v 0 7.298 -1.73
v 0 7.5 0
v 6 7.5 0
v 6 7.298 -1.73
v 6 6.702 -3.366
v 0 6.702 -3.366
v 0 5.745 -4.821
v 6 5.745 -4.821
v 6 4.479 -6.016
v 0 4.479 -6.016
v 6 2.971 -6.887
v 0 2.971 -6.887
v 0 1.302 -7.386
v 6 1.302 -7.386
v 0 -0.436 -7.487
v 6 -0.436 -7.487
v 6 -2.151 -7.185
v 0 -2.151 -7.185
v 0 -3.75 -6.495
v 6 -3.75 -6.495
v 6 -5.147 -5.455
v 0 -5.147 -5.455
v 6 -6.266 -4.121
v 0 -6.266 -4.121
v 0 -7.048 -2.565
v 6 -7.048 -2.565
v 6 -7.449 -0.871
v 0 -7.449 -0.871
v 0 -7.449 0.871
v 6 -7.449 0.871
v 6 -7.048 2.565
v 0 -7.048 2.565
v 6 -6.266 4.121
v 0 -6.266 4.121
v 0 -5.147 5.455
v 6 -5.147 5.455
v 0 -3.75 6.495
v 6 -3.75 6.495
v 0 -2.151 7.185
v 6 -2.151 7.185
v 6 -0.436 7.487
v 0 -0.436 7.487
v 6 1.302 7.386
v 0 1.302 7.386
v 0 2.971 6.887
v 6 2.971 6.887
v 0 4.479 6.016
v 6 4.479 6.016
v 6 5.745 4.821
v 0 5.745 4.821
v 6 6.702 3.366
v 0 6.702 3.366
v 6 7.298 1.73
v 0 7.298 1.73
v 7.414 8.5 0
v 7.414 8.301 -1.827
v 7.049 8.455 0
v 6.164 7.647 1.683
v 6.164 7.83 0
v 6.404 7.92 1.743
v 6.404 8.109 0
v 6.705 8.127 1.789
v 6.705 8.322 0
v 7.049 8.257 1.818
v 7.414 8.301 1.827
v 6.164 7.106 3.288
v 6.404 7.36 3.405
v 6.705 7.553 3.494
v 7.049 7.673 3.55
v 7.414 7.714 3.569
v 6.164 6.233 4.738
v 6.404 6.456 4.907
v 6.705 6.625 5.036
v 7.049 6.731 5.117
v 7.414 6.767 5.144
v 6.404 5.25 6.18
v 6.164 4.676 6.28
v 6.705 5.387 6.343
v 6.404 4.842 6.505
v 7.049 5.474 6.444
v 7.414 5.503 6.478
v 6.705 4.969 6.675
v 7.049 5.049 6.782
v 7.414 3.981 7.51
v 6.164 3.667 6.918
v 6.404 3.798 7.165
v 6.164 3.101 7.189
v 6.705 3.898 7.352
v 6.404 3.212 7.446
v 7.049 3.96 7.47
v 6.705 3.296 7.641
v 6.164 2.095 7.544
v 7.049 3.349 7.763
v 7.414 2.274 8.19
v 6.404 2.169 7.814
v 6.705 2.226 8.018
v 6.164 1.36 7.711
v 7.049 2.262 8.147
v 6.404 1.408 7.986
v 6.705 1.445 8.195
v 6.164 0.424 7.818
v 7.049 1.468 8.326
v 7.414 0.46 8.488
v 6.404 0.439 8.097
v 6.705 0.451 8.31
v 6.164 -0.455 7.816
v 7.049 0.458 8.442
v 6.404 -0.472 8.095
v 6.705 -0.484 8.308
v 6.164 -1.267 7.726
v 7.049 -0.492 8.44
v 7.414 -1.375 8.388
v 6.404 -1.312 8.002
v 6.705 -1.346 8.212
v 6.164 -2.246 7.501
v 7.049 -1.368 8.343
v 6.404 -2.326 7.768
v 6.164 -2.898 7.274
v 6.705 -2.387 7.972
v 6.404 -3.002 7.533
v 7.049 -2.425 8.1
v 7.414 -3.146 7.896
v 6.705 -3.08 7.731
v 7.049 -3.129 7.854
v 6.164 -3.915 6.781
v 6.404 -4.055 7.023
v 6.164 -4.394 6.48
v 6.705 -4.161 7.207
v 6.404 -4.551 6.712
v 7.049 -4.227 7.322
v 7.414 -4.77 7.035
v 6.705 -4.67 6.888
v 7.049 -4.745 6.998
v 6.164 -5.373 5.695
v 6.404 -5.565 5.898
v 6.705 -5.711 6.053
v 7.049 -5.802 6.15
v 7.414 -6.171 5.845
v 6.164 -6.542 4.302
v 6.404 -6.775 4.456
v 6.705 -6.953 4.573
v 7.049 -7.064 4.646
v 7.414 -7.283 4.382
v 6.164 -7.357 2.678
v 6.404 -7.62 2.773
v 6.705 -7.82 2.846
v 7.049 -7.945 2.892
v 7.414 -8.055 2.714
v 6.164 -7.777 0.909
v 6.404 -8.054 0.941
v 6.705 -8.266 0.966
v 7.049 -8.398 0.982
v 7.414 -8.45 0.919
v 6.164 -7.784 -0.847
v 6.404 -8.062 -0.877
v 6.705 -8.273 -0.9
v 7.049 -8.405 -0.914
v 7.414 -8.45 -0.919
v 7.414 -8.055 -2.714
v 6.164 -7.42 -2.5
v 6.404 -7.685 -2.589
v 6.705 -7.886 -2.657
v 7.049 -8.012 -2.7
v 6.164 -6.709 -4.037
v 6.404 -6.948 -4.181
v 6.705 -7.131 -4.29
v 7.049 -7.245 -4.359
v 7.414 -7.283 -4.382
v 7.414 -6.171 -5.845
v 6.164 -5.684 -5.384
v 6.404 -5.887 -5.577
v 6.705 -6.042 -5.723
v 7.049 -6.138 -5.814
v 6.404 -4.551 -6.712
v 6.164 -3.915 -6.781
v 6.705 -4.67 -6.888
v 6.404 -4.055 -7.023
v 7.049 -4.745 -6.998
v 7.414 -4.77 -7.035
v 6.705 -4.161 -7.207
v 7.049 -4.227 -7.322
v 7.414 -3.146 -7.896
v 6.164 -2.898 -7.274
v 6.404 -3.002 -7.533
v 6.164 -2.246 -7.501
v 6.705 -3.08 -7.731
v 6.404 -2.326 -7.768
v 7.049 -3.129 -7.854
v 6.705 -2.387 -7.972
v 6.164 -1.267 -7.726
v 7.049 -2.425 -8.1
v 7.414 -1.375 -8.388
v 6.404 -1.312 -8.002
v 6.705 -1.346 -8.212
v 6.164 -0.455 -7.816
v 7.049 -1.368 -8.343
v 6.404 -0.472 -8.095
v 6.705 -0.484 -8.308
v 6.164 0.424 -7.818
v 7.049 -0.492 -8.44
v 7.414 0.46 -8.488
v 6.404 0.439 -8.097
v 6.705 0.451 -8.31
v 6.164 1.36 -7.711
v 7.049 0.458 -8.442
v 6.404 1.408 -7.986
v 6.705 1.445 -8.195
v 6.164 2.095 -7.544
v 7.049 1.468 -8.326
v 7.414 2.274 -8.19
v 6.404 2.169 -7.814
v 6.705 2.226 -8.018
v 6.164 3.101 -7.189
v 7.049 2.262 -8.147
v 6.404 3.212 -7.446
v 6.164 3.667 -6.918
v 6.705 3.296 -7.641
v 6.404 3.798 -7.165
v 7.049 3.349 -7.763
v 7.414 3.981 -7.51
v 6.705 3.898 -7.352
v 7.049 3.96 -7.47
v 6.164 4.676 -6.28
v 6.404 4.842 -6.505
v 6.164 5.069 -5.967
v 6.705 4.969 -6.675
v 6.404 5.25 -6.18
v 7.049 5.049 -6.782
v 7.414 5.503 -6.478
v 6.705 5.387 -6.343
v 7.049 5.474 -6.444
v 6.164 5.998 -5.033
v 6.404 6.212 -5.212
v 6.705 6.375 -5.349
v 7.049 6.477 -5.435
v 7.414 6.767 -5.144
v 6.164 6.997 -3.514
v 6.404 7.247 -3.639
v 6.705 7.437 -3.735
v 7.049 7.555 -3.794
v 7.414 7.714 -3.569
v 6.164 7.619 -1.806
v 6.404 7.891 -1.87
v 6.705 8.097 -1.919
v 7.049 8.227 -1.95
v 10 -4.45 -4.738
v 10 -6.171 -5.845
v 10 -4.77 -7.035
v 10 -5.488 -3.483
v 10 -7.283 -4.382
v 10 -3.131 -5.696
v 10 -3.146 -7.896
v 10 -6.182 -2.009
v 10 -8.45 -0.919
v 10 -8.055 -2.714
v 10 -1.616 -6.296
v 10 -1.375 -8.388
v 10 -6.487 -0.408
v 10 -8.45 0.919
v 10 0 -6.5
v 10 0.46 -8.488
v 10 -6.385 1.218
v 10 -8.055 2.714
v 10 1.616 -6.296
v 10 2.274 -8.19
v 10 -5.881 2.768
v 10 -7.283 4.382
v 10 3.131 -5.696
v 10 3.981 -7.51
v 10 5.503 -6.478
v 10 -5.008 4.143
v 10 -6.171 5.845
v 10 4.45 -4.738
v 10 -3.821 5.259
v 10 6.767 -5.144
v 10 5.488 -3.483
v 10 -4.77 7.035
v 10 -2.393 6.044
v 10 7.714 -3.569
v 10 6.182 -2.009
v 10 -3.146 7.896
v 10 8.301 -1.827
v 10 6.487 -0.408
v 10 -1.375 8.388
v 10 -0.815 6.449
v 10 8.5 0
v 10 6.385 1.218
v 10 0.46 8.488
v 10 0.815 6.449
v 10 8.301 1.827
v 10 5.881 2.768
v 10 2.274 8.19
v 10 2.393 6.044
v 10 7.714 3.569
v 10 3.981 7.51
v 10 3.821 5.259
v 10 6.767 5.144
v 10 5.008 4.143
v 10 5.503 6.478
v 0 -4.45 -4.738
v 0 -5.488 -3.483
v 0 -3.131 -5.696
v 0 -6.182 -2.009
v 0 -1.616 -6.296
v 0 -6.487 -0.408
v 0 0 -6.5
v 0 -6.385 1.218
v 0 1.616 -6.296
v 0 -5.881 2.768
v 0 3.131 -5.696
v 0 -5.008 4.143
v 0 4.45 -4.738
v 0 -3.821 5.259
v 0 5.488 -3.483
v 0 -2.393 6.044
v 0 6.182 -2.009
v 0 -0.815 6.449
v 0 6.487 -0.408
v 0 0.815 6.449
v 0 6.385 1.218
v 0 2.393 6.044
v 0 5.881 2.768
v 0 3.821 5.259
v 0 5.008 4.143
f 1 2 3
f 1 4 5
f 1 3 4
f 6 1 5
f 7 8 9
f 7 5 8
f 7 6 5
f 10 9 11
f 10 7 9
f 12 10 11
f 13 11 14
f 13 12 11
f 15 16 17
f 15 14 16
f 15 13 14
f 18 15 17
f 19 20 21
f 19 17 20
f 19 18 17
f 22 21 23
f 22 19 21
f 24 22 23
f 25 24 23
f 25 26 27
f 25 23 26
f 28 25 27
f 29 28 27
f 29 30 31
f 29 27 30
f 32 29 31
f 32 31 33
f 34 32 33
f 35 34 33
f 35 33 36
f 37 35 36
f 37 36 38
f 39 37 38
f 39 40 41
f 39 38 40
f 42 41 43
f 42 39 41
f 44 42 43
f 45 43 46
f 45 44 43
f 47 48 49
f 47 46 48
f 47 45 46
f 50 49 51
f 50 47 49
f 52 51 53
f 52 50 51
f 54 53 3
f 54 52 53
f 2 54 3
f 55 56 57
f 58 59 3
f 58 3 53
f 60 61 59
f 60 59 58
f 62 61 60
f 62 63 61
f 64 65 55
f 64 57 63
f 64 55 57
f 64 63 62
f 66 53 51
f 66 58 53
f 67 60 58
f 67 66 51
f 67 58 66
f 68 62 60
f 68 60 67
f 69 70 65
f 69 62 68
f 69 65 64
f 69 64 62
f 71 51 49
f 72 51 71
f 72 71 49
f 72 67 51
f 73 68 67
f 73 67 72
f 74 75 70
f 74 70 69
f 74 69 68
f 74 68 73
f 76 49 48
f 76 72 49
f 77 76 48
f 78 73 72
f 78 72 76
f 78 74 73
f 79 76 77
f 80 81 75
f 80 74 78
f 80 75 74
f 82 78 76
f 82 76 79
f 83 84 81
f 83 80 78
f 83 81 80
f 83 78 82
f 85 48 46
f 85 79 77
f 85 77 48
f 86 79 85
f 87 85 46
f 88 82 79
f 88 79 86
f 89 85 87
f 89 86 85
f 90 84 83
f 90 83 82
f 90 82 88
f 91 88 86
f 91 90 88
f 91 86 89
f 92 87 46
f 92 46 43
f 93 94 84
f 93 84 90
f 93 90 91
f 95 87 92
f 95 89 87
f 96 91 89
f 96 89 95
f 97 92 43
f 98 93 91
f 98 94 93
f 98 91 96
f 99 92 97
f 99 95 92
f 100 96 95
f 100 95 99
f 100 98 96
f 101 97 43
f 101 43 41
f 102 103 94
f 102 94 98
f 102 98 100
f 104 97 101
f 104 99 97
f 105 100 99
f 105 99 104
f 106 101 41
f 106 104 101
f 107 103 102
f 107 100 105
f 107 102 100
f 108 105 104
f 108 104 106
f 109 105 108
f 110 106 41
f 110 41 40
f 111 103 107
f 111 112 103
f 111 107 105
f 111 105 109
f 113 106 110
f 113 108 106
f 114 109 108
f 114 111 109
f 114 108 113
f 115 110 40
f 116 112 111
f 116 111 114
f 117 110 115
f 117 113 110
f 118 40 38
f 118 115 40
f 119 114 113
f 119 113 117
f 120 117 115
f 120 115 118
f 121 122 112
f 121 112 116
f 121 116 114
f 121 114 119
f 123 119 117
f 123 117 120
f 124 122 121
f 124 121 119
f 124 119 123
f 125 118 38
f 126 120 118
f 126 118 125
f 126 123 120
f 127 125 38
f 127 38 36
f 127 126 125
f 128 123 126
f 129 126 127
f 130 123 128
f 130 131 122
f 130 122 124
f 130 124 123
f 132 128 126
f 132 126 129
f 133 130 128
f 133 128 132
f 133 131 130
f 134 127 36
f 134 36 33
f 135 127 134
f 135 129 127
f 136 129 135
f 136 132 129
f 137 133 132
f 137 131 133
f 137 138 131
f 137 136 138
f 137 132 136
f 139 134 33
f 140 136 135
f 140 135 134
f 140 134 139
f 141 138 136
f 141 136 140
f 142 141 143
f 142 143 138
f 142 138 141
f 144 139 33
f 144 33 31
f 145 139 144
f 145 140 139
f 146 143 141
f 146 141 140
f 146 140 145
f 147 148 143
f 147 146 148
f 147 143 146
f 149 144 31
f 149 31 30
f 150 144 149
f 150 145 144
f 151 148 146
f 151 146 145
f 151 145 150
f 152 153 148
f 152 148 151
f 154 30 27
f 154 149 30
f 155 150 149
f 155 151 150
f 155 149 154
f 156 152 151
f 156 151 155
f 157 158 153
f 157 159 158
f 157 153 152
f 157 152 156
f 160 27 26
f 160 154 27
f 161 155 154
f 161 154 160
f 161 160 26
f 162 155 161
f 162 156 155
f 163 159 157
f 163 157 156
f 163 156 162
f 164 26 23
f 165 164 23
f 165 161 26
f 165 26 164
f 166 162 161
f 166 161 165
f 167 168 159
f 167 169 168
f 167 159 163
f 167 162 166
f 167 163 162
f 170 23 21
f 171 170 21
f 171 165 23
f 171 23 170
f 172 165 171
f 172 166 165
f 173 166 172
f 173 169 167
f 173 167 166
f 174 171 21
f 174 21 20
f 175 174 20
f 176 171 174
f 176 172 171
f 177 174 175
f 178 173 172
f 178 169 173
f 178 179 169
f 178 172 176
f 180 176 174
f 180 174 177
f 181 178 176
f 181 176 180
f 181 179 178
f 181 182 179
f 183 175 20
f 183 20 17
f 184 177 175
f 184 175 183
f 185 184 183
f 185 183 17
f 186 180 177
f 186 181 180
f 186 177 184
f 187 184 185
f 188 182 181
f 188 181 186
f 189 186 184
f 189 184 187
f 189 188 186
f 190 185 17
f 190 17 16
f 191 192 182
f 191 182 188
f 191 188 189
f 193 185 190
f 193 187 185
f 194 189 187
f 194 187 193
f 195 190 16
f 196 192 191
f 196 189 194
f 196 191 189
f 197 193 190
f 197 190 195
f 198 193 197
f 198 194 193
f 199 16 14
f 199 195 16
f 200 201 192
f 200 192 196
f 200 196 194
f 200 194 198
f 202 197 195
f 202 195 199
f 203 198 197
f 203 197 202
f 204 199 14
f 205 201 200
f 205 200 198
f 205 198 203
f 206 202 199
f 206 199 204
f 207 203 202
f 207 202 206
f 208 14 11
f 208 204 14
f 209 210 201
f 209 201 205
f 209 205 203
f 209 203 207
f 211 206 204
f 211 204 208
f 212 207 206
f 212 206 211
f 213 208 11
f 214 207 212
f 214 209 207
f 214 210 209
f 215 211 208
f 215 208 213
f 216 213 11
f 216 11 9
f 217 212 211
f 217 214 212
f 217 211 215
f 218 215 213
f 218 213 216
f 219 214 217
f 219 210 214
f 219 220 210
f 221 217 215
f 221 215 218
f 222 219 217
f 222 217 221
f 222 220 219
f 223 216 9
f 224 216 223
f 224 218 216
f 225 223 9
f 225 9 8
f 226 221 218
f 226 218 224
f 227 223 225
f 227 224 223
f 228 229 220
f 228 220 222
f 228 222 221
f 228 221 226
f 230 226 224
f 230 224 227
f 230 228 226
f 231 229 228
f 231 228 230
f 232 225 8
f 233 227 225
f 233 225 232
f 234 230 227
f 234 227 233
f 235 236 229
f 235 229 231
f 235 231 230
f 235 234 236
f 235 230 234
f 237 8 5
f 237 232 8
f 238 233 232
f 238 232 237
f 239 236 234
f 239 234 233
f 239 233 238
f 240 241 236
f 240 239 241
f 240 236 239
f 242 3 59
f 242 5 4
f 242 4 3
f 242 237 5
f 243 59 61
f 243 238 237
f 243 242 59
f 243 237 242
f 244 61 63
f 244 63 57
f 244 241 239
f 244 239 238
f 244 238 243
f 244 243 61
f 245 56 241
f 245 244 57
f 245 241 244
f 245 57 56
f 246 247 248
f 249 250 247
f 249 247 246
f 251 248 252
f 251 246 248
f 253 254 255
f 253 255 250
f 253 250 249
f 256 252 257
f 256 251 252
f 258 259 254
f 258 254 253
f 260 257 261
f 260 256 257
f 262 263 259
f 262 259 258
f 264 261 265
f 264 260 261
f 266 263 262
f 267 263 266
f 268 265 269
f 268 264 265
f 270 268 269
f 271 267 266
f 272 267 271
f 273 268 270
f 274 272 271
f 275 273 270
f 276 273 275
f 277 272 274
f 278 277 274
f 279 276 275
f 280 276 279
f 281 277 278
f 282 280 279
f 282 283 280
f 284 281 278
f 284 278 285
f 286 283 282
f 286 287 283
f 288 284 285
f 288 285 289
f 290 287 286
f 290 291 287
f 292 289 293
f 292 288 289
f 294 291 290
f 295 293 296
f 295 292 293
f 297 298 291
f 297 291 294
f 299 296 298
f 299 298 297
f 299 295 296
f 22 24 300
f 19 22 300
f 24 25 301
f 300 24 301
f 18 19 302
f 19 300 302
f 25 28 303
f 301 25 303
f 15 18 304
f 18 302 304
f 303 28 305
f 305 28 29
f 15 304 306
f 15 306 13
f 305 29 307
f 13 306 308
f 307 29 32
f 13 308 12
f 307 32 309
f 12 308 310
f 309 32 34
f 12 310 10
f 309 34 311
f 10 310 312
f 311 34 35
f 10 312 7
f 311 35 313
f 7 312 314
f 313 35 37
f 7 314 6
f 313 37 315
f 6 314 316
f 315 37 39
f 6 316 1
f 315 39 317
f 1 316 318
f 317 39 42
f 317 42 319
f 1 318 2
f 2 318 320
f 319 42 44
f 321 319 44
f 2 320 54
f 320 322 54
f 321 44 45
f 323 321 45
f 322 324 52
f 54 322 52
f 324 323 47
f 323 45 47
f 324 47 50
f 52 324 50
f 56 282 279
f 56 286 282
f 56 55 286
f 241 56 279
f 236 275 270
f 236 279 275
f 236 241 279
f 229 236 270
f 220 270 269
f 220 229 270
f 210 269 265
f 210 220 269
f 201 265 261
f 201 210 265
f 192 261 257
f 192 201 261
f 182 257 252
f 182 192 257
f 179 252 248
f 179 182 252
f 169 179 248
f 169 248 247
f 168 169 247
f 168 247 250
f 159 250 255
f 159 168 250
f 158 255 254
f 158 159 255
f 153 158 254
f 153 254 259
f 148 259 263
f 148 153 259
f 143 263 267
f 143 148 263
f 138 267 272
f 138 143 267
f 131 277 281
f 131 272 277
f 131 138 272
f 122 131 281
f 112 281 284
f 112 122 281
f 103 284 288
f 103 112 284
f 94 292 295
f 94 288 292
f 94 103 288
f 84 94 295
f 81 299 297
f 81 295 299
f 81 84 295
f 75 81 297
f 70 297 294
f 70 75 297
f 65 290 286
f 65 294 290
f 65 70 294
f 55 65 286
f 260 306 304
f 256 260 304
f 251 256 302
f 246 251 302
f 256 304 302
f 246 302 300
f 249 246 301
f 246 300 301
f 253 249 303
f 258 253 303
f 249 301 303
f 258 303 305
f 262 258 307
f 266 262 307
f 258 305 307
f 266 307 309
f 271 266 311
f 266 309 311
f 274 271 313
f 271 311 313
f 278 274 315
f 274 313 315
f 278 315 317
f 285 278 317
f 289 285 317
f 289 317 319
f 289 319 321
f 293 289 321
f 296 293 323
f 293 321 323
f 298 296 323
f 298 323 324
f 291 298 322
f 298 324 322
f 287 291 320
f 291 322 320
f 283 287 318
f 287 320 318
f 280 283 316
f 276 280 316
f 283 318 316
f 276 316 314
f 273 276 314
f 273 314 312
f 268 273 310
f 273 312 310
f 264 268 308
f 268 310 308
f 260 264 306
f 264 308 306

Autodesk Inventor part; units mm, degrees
ref_plane "YZ Plane" through (0, 0, 0) normal (1, 0, 0) x (0, 1, 0)
ref_plane "XZ Plane" through (0, 0, 0) normal (0, 1, 0) x (-1, 0, 0)
ref_plane "XY Plane" through (0, 0, 0) normal (0, 0, 1) x (1, 0, 0)
sketch "Sketch1" plane through (0, 0, 0) normal (0, 0, 1) x (1, 0, 0)
  line L0 (0, 0) -> (6, 0)
  line L1 (6, 0) -> (6, 7.5)
  line L2 (6, 7.5) -> (0, 7.5)
  line L3 (0, 7.5) -> (0, 0)
  line L4 (6, 0) -> (10, 0)
  line L5 (10, 0) -> (10, 8.5)
  line L6 (10, 8.5) -> (6, 8.5)
  line L7 (6, 8.5) -> (6, 0)
  dimension "d0" = 15
  dimension "d1" = 17
  dimension "d2" = 6
  dimension "d3" = 10
revolve "Revolution1" add sketch "Sketch1" angle 360 about axis through (0, 0, 0) along (1, 0, 0)
fillet "Fillet1" radius 1.5 1 edges at (6, -8.5, 0)
hole "Hole1" at (10, 0, 0) direction (-1, 0, 0) diameter 13 end through all
properties part number "405-03" material "Steel, Mild"
